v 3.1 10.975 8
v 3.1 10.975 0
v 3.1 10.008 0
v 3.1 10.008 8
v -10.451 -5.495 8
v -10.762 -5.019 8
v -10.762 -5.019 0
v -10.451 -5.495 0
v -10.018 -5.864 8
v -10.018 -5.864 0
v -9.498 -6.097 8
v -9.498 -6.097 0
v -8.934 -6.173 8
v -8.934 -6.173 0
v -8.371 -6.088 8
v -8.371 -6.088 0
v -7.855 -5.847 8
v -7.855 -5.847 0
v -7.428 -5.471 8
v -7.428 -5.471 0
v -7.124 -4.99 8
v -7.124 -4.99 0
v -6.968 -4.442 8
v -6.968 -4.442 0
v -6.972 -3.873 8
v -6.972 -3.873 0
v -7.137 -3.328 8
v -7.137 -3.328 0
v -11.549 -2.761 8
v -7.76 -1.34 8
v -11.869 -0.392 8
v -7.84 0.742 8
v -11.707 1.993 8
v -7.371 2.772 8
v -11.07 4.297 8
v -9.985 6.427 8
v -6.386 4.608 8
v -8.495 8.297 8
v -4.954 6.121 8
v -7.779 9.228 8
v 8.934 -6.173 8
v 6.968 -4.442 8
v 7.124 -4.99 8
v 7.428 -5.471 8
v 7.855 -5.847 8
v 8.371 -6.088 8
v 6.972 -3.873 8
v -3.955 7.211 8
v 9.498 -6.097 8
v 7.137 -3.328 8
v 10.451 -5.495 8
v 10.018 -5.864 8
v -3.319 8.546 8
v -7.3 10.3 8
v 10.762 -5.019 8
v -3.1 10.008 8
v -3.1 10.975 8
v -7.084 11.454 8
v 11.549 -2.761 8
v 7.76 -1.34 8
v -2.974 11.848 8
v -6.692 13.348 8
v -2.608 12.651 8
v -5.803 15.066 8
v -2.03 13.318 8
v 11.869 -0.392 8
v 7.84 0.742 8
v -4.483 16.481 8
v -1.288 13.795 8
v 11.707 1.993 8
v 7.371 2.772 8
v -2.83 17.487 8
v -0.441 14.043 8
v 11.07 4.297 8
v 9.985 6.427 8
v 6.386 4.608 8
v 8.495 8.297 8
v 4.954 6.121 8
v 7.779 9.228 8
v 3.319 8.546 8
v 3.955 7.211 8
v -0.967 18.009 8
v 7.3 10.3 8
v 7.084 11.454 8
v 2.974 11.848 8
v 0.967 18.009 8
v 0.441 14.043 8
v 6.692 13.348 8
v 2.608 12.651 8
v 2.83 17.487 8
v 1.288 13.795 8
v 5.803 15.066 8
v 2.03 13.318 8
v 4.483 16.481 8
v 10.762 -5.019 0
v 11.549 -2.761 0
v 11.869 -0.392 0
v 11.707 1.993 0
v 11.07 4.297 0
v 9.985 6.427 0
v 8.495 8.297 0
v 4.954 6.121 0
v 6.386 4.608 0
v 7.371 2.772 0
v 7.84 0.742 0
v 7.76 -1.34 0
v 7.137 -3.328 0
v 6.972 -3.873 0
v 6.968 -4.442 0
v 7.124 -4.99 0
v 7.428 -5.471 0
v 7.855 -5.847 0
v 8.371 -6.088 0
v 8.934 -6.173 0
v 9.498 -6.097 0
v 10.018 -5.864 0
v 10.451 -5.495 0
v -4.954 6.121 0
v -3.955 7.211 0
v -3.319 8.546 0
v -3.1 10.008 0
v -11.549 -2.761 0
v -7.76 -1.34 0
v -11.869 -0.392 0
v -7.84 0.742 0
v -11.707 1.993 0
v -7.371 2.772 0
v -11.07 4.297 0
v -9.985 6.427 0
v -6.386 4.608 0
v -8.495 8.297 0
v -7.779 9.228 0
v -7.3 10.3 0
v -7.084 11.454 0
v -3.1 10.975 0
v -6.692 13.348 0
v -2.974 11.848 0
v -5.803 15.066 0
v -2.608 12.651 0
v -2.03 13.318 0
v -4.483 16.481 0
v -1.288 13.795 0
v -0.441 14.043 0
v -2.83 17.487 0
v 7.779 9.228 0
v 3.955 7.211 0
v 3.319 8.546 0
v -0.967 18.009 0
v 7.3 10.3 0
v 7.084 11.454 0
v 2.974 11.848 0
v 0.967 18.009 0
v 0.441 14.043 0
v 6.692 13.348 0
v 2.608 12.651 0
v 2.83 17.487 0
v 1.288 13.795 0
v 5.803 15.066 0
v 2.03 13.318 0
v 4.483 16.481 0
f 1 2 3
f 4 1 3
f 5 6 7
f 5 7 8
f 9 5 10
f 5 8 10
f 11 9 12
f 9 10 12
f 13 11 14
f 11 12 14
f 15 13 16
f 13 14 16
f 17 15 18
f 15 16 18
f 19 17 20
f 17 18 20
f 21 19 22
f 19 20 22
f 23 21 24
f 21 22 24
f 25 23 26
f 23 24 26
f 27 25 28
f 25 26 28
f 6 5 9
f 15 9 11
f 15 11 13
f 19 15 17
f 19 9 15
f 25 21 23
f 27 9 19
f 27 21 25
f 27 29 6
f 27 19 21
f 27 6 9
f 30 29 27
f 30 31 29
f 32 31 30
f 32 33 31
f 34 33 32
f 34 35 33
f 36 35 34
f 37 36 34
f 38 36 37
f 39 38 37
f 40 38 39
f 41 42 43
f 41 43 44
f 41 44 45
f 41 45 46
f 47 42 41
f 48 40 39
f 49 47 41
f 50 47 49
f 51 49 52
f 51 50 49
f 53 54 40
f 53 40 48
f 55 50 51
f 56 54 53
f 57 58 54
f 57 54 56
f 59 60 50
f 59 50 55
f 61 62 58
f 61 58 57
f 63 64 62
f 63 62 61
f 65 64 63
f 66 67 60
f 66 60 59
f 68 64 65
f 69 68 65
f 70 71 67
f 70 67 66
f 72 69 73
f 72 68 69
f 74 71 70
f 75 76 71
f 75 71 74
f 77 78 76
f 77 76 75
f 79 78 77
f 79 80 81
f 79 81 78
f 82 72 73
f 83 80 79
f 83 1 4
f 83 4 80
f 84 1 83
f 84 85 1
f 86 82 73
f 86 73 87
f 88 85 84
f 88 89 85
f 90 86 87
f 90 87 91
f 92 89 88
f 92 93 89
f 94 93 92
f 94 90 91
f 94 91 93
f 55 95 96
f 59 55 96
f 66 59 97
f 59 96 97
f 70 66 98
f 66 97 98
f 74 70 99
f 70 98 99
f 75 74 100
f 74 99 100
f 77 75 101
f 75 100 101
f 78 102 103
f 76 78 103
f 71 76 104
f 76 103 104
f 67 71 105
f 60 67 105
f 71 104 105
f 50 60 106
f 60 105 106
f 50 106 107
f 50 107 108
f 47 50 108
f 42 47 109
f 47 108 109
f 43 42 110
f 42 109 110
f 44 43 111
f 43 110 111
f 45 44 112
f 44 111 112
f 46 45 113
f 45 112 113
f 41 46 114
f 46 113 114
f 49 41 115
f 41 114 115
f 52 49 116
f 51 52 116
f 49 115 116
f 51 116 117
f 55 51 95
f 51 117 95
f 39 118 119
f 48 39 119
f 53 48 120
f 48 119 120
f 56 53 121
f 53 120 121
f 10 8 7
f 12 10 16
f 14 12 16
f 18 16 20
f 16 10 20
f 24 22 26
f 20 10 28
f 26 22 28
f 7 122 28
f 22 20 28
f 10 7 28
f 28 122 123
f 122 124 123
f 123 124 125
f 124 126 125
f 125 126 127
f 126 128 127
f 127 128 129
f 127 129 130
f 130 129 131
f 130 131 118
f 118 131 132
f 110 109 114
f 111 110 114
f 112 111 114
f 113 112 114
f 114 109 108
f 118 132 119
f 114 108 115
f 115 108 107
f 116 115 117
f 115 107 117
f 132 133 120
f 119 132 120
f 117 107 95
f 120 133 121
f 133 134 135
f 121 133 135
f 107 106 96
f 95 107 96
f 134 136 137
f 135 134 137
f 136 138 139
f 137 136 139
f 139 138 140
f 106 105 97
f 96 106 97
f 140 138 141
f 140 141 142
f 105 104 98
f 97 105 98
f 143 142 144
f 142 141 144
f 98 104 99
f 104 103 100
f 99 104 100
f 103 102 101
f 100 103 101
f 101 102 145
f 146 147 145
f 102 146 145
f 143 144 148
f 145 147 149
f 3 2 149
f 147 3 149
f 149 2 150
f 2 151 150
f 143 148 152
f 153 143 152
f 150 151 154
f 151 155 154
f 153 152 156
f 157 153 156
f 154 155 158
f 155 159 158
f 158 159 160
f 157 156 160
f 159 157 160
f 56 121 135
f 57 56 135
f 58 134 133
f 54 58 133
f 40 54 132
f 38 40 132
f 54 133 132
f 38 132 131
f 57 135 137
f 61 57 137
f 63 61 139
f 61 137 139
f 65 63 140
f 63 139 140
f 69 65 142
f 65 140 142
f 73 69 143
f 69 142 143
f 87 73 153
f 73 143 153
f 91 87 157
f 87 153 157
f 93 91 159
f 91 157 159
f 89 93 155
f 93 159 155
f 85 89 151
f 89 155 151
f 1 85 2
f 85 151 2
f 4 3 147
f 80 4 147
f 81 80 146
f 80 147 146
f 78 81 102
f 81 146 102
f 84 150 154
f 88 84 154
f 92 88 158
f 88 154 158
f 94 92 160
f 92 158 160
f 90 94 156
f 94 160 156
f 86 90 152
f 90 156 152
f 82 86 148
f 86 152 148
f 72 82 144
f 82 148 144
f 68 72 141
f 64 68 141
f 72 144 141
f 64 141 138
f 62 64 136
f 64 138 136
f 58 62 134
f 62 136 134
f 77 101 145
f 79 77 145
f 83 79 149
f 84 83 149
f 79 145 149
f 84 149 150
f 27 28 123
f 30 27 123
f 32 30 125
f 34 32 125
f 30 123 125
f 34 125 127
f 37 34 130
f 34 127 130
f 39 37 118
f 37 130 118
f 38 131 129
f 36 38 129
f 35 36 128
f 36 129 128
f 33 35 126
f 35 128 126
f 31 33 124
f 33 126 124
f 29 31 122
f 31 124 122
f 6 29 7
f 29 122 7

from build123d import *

# Parameters (mm, degrees)
F2_DEPTH = 8


with BuildPart() as f2:
    # F1 (on Top) → F2 (new body)
    with BuildSketch(Plane.XY):
        with BuildLine():
            ThreePointArc((4.954369, 6.121262), (7.672943, 1.772448), (7.137174, -3.328119))
            ThreePointArc((7.137174, -3.328119), (8.104553, -5.985971), (10.762405, -5.018592))
            ThreePointArc((10.762405, -5.018592), (11.706561, 1.993), (8.495444, 8.297172))
            ThreePointArc((8.495444, 8.297172), (7.508107, 9.749502), (7.083848, 11.453644))
            ThreePointArc((7.083848, 11.453644), (0, 18.075), (-7.083848, 11.453644))
            ThreePointArc((-7.083848, 11.453644), (-7.508107, 9.749502), (-8.495444, 8.297172))
            ThreePointArc((-8.495444, 8.297172), (-11.706561, 1.993), (-10.762405, -5.018592))
            ThreePointArc((-10.762405, -5.018592), (-8.104553, -5.985971), (-7.137174, -3.328119))
            ThreePointArc((-7.137174, -3.328119), (-7.672943, 1.772448), (-4.954369, 6.121262))
            ThreePointArc((-4.954369, 6.121262), (-3.587343, 7.854659), (-3.1, 10.007778))
            Line((-3.1, 10.007778), (-3.1, 10.975))
            ThreePointArc((-3.1, 10.975), (0, 14.075), (3.1, 10.975))
            Line((3.1, 10.975), (3.1, 10.007778))
            ThreePointArc((3.1, 10.007778), (3.587343, 7.854659), (4.954369, 6.121262))
        make_face()
    extrude(amount=F2_DEPTH)


solid = f2.part
